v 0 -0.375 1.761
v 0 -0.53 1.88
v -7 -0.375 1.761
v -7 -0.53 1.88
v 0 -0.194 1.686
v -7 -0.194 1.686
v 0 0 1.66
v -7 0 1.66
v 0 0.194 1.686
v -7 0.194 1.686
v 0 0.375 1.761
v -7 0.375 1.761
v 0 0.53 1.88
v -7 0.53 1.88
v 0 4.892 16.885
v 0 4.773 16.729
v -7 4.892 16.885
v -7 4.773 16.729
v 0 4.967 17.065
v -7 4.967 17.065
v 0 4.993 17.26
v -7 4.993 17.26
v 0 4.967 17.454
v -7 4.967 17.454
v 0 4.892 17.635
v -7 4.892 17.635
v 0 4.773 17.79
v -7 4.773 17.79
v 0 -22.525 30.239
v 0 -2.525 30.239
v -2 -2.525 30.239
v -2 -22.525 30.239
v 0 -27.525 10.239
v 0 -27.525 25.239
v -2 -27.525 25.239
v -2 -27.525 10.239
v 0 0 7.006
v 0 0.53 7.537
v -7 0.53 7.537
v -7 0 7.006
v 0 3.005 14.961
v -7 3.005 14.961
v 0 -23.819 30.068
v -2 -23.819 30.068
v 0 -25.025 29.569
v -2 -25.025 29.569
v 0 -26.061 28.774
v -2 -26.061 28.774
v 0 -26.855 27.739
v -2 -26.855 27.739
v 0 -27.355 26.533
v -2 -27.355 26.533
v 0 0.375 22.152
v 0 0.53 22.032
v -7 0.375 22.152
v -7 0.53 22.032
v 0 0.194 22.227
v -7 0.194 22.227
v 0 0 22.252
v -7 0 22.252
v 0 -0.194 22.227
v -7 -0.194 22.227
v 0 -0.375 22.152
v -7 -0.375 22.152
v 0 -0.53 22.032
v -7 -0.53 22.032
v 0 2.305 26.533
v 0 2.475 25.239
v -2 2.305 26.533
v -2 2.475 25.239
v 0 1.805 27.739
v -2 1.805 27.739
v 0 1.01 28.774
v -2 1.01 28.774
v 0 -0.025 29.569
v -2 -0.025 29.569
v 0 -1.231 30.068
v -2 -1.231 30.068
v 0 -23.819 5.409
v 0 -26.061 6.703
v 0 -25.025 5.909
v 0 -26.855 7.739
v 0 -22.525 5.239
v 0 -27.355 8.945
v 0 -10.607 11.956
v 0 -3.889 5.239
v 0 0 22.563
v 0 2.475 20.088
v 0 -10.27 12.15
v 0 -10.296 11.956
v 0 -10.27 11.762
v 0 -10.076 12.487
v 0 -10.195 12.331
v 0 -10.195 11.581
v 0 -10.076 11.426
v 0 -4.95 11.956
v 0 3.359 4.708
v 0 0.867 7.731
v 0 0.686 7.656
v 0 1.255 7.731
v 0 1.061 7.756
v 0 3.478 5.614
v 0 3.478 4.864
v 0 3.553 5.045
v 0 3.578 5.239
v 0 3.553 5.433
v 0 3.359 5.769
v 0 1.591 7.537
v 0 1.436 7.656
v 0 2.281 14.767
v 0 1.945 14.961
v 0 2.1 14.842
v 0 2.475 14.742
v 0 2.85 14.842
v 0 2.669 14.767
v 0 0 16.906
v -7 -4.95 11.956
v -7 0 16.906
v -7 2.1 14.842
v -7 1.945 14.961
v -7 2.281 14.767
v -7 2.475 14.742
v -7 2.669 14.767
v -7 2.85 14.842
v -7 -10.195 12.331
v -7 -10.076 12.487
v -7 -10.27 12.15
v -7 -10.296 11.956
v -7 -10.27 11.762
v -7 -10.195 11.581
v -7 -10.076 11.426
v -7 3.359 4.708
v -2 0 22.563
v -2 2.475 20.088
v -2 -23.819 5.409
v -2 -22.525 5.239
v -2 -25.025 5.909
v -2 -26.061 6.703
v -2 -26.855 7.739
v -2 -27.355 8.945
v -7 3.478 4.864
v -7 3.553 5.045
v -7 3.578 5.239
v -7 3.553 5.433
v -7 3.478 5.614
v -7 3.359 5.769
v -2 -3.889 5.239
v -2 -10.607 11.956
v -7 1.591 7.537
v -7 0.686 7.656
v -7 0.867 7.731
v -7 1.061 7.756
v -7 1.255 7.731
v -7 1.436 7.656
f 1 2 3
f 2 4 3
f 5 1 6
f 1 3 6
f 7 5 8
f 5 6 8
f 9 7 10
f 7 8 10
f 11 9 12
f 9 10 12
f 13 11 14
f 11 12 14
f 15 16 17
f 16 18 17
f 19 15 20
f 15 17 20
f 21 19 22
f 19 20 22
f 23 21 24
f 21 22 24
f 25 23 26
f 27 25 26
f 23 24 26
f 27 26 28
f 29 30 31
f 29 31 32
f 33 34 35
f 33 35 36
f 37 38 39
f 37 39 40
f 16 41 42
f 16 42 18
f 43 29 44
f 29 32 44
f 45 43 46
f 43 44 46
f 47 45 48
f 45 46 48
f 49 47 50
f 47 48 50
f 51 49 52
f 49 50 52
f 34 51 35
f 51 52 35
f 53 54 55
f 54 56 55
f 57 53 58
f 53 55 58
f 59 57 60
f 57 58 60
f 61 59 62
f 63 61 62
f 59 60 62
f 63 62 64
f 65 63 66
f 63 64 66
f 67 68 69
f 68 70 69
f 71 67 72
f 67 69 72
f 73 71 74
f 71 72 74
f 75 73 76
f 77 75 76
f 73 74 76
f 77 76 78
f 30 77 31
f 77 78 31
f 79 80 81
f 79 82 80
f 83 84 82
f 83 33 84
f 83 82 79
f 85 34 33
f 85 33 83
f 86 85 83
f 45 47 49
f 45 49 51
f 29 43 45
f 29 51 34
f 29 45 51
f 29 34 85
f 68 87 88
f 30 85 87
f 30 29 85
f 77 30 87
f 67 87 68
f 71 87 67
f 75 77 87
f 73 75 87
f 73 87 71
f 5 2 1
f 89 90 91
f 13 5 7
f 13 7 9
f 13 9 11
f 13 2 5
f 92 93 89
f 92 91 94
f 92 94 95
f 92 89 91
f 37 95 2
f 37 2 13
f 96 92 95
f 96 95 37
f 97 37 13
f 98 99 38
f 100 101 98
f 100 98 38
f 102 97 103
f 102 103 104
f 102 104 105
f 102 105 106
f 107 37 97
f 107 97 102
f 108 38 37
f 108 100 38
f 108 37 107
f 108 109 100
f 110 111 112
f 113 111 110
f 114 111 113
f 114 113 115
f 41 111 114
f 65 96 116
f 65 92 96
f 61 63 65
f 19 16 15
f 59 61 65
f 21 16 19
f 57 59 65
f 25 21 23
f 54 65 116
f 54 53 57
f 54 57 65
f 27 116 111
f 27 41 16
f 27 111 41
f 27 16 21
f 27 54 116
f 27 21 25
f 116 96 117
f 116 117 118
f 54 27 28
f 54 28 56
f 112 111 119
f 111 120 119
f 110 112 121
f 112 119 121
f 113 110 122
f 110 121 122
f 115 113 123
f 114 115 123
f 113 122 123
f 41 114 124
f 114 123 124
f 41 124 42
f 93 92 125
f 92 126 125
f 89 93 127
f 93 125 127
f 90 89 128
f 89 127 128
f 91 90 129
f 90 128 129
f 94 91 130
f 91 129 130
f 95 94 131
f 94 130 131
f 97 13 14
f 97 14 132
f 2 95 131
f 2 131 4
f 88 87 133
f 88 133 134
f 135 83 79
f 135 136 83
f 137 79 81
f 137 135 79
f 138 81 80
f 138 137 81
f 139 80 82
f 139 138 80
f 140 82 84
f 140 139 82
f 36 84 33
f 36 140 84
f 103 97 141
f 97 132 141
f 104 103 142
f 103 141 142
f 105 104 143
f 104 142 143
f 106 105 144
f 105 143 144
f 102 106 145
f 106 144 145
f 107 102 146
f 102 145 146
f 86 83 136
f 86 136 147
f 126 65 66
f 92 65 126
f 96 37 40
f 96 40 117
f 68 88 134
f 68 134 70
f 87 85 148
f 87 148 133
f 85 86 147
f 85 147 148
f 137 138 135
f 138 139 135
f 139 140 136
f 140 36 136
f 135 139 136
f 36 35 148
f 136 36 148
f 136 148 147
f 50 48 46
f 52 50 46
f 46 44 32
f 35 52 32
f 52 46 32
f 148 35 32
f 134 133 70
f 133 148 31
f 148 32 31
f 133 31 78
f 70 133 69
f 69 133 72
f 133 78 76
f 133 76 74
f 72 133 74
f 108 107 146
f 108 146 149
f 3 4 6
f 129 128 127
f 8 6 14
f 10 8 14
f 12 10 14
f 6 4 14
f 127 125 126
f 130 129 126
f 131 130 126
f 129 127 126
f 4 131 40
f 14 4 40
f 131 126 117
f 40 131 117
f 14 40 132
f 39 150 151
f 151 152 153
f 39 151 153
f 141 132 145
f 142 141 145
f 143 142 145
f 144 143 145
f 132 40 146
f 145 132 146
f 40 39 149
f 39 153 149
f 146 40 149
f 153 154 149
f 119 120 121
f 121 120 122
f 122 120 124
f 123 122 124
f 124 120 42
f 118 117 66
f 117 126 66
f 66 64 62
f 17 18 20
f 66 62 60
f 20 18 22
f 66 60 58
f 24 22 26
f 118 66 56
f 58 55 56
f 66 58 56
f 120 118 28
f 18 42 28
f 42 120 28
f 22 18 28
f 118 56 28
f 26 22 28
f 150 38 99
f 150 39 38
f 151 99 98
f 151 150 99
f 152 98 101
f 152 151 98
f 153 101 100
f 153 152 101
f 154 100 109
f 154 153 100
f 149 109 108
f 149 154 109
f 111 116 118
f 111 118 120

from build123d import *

# Parameters (mm, degrees)
F1_DEPTH = 7
F2_DEPTH = 2
F3_R     = 5
F4_R     = 0.75


with BuildPart() as f1:
    # F0 (on Right) → F1 (new body)
    with BuildSketch(Plane.YZ):
        Polygon((1.06066, 8.067118), (0, 7.006457), (-4.949747, 11.956205), (0, 16.905952), (2.474874, 14.431079), (2.474874, 20.087933), (0, 22.562807), (-10.606602, 11.956205), (-3.889087, 5.23869), (3.889087, 5.23869), align=None)
        Polygon((0, 1.349603), (3.889087, 5.23869), (-3.889087, 5.23869), align=None)
        Polygon((2.474874, 20.087933), (2.474874, 14.431079), (5.303301, 17.259506), align=None)
    extrude(amount=-F1_DEPTH)

    # F4
    f4_edges = [f1.edges().sort_by_distance(p)[0] for p in [
        (-3.5, 2.474874, 14.431079),
        (-3.5, 1.06066, 8.067118),
        (-3.5, 0, 1.349603),
        (-3.5, 3.889087, 5.23869),
        (-3.5, 5.303301, 17.259506),
        (-3.5, 0, 22.562807),
        (-3.5, -10.606602, 11.956205),
    ]]
    fillet(f4_edges, radius=F4_R)


with BuildPart() as f2:
    # F0 (on Right) → F2 (new body)
    with BuildSketch(Plane.YZ):
        Polygon((-27.525126, 5.23869), (-3.889087, 5.23869), (-10.606602, 11.956205), (0, 22.562807), (2.474874, 20.087933), (2.474874, 30.23869), (-27.525126, 30.23869), align=None)
    extrude(amount=-F2_DEPTH)

    # F3
    f3_edges = [f2.edges().sort_by_distance(p)[0] for p in [
        (-1, 2.474874, 30.23869),
        (-1, -27.525126, 30.23869),
        (-1, -27.525126, 5.23869),
    ]]
    fillet(f3_edges, radius=F3_R)


solid = Compound([f1.part, f2.part])
